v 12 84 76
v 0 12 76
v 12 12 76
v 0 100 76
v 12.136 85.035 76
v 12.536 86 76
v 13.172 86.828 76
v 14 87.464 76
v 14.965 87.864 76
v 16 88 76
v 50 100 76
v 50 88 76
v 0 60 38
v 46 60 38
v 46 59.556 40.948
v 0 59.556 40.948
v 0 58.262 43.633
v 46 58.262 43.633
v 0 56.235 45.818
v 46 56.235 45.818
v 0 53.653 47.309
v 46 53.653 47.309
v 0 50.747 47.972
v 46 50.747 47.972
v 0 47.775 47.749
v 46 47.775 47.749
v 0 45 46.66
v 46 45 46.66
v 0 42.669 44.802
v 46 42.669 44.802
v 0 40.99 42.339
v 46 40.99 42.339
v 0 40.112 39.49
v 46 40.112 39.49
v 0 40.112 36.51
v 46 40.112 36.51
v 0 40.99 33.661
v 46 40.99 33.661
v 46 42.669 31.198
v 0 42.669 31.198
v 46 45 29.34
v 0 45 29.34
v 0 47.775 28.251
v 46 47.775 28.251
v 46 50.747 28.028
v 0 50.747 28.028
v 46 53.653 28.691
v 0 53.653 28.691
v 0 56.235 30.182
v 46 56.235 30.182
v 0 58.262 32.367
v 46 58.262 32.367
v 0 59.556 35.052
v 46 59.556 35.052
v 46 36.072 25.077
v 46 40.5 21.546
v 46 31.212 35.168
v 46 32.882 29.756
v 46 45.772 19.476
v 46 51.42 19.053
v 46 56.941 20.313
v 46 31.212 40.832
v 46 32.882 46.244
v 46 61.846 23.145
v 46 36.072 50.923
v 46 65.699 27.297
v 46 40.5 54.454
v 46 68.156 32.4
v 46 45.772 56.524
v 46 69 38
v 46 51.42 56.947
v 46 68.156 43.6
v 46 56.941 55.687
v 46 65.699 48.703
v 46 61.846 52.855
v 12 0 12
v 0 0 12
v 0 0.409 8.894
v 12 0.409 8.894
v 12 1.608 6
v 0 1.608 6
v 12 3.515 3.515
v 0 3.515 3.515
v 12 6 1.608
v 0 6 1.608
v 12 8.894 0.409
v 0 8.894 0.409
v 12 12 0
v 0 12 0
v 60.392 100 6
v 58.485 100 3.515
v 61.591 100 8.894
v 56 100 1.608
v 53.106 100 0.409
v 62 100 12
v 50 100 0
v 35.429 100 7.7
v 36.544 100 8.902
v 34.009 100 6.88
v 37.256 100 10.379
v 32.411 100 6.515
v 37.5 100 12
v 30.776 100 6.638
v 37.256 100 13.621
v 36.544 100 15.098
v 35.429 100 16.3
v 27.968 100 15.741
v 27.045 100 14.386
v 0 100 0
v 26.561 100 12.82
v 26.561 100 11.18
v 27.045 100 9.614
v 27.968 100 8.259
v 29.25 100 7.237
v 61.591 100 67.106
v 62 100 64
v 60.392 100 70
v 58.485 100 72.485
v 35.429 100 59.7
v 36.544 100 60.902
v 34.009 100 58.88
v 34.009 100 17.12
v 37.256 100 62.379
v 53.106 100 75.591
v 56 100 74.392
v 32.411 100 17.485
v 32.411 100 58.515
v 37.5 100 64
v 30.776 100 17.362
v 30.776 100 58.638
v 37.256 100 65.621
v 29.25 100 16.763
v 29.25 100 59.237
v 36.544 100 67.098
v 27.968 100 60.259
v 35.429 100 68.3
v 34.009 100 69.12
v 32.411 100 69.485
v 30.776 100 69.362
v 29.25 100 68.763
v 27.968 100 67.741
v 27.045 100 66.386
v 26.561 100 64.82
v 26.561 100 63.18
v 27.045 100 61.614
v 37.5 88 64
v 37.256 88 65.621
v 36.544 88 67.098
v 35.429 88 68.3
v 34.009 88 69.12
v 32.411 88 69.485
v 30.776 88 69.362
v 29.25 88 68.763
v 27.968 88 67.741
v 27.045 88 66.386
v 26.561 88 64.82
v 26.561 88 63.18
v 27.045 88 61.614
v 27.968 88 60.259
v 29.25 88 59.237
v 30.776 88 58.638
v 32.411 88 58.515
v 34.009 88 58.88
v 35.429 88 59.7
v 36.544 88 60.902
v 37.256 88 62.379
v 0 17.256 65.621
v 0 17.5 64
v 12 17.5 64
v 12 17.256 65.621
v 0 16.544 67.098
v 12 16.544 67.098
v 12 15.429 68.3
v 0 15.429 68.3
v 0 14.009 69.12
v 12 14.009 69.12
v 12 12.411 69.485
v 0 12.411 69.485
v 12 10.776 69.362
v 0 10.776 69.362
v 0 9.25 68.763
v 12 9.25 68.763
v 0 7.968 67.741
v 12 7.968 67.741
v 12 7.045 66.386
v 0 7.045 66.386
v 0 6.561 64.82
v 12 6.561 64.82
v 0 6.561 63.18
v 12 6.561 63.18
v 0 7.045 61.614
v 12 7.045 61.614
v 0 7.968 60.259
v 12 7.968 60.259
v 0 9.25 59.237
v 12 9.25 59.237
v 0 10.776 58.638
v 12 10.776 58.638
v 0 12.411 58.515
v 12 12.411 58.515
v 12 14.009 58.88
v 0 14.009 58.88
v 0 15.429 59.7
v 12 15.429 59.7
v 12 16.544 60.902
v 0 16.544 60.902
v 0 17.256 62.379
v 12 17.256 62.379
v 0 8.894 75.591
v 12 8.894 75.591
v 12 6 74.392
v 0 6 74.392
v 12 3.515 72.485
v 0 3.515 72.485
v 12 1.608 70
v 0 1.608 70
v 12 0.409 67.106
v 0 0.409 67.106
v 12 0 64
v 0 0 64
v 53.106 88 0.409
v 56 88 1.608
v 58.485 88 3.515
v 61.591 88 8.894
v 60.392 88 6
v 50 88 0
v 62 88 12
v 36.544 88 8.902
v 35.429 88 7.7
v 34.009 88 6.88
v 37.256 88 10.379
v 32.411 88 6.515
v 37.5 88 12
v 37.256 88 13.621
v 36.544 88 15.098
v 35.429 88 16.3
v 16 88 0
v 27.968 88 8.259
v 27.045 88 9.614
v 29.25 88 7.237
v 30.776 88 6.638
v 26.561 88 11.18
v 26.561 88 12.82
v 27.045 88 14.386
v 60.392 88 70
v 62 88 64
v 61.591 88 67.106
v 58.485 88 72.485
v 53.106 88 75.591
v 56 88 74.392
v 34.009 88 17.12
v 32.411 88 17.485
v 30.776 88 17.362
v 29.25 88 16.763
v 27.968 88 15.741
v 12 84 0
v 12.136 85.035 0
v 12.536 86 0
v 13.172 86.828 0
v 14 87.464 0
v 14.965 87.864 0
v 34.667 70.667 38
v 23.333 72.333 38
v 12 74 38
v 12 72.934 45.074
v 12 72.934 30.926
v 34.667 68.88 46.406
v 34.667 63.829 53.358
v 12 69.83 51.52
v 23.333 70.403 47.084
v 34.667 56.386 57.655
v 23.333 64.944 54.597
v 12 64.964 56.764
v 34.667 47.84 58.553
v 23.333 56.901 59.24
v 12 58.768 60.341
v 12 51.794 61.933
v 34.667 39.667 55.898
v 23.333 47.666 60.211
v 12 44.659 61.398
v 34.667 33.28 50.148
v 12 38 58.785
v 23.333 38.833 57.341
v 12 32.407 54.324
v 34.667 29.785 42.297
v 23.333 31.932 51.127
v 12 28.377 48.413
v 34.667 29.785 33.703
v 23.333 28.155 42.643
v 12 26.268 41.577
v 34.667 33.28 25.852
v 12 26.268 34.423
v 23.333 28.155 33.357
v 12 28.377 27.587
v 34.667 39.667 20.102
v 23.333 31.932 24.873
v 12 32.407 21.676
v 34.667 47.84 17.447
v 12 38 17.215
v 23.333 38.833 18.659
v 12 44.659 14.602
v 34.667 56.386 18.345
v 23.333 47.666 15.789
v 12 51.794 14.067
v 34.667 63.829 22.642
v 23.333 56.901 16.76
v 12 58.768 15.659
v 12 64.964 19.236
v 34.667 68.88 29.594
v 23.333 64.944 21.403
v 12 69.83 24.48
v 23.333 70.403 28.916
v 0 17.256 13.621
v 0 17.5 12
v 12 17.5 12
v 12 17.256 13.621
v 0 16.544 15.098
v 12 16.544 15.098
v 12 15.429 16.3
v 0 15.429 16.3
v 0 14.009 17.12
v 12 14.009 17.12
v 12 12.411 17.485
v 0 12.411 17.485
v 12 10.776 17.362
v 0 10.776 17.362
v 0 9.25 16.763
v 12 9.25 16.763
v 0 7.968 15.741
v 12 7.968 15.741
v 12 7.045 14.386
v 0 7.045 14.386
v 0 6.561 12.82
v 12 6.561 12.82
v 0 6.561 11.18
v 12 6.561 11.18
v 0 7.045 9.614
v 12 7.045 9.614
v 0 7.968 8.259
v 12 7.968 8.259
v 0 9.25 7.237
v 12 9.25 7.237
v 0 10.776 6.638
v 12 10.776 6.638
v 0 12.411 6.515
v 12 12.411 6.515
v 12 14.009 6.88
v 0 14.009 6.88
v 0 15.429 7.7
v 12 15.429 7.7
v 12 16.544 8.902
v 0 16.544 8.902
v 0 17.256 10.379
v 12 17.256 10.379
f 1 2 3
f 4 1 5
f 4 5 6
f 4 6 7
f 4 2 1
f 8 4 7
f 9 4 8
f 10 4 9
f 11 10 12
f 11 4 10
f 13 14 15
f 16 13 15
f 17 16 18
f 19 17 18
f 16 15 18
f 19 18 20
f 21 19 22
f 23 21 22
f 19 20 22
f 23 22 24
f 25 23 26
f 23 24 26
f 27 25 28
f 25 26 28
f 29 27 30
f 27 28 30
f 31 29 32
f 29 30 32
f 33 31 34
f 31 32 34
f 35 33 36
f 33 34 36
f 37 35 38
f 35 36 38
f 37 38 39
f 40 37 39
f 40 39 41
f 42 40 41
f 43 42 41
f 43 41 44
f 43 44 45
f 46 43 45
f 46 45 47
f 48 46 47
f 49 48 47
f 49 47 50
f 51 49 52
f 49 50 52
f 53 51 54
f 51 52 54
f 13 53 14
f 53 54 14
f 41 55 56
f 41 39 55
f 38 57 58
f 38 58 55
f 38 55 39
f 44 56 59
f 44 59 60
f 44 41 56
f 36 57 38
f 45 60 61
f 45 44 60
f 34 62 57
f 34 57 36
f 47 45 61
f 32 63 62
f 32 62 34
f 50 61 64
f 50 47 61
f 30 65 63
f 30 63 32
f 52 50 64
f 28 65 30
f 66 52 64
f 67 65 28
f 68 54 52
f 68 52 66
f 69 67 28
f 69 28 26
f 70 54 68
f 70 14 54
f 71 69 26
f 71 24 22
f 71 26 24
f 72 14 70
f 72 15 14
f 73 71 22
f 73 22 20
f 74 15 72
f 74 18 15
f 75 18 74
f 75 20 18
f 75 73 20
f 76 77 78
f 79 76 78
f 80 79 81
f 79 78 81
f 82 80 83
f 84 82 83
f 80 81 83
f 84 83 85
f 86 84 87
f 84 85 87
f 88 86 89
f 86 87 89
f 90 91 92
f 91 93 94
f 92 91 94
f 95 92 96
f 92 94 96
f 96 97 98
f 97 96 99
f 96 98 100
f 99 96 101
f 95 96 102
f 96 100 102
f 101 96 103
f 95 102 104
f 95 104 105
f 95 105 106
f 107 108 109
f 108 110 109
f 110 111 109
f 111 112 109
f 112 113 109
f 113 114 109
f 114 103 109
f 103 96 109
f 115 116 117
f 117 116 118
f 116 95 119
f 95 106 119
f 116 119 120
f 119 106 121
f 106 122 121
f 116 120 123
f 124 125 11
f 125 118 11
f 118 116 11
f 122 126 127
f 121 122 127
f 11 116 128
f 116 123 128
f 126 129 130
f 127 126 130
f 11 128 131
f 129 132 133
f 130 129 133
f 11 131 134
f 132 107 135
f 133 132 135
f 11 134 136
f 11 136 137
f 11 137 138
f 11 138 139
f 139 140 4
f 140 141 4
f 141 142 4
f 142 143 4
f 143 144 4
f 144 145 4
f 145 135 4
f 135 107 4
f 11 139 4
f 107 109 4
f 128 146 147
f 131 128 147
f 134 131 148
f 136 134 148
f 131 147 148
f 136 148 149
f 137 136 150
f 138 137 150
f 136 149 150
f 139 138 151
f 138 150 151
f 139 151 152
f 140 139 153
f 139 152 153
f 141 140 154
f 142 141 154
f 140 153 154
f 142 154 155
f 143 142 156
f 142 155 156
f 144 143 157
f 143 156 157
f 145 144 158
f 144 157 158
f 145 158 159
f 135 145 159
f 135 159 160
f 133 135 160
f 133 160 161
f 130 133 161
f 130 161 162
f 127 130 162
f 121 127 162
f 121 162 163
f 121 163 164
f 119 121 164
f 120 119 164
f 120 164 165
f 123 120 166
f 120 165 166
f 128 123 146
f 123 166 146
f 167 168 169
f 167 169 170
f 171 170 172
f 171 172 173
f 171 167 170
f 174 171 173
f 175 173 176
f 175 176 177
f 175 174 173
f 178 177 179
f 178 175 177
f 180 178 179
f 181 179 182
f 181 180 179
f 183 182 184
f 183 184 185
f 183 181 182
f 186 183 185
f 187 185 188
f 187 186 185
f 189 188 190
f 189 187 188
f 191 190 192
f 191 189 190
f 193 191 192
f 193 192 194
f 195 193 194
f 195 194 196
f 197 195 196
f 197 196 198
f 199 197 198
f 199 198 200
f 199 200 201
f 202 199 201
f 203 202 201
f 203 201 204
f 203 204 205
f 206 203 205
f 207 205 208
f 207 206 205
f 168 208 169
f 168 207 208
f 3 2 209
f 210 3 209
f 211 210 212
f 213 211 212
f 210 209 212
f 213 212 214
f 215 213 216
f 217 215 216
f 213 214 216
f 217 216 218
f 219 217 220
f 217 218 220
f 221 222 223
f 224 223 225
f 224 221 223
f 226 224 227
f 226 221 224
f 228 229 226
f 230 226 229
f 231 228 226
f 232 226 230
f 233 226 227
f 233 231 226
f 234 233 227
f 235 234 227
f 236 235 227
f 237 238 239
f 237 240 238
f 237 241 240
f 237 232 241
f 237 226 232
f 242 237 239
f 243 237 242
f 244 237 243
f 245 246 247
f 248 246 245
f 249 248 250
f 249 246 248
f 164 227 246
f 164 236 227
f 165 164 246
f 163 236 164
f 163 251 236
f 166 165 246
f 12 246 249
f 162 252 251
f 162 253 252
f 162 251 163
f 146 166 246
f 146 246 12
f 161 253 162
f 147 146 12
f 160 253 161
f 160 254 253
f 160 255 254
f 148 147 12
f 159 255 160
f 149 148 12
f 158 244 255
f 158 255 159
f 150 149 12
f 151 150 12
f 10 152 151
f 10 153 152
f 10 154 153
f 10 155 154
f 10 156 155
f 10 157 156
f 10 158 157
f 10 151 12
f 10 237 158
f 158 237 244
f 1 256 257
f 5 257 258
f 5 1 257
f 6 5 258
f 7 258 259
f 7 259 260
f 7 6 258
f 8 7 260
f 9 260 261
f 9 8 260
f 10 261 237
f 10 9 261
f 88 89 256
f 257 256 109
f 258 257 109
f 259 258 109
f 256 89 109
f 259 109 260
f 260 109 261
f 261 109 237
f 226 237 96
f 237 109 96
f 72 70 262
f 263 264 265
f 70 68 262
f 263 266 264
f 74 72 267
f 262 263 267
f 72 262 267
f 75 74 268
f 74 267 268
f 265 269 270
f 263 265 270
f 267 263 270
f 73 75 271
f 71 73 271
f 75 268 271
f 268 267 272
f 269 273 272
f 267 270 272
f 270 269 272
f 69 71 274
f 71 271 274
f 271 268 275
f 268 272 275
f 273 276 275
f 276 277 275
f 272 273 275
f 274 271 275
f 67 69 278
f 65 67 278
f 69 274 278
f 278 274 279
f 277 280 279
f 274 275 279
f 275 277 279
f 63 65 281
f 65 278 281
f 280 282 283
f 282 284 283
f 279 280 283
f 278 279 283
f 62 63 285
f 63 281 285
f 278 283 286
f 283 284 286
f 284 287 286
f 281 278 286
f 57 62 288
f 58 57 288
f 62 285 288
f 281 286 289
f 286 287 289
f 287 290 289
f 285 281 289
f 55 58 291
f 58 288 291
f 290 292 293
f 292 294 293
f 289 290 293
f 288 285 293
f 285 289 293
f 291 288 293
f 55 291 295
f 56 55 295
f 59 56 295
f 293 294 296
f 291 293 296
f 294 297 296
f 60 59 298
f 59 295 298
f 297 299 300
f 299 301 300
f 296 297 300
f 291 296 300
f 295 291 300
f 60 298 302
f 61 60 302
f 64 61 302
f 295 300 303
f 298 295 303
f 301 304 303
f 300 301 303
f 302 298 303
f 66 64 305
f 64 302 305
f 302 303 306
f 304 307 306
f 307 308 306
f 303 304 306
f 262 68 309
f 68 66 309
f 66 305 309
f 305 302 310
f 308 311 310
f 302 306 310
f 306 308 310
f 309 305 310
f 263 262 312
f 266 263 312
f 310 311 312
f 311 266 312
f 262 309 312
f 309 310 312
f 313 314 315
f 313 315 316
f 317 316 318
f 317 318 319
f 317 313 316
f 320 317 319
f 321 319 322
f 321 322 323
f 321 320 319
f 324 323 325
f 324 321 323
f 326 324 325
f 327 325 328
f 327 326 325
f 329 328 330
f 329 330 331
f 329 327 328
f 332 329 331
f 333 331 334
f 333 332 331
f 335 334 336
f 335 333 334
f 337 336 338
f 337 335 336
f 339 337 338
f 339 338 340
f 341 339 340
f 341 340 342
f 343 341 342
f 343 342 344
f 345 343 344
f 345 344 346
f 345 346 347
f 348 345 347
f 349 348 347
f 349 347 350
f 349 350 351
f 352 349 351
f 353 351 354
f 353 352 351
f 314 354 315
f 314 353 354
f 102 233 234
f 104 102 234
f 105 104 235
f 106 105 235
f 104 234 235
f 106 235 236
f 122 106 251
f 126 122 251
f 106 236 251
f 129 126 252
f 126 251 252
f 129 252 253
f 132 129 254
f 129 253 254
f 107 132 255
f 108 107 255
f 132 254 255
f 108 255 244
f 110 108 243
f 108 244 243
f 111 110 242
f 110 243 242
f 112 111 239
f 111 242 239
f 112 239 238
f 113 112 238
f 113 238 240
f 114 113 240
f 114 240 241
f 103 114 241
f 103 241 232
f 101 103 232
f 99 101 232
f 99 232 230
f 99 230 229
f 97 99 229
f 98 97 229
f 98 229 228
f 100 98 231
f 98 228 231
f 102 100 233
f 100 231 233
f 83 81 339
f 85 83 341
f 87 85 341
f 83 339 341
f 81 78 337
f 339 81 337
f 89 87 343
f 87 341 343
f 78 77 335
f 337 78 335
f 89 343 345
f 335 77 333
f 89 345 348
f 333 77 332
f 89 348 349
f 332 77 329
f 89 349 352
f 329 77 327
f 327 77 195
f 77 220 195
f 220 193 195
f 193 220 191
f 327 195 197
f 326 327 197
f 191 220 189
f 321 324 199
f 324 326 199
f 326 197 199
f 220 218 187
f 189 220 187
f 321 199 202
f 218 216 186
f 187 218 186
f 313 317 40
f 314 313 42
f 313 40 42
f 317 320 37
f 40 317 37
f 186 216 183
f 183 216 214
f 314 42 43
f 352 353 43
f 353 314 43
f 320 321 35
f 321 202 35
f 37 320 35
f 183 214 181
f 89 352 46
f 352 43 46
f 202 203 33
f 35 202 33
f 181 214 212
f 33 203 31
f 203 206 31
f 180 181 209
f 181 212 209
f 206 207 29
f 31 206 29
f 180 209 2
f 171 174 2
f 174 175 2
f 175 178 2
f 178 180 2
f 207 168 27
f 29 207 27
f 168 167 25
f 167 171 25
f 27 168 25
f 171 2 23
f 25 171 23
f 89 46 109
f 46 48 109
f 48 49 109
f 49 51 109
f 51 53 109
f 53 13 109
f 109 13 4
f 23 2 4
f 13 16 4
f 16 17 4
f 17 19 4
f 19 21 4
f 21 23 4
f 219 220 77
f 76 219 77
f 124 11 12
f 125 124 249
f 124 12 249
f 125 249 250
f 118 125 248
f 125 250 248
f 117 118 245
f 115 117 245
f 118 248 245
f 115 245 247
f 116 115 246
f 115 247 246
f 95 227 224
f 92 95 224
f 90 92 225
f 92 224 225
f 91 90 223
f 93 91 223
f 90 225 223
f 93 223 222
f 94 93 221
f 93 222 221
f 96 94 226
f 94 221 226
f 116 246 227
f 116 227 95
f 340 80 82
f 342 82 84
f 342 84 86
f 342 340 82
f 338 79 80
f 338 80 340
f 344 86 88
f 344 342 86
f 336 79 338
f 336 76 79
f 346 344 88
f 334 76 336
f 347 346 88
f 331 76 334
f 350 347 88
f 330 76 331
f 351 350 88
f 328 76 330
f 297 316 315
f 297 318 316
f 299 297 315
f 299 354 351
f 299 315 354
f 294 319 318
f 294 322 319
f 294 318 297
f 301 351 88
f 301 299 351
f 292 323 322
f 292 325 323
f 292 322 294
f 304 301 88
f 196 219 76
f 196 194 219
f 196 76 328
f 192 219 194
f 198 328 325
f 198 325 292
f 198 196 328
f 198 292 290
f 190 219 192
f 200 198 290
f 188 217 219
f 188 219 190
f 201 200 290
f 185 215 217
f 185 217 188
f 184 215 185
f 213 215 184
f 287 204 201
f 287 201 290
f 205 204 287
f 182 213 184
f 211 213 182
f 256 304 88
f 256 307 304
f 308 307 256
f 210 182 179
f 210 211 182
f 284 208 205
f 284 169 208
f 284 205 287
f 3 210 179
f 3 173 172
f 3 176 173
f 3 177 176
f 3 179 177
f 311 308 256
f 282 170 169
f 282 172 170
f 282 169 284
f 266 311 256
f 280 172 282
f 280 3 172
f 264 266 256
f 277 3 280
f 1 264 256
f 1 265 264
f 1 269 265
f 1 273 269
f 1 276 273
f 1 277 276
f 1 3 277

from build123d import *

# Parameters (mm, degrees)
F0_R      = 5.5
F1_DEPTH  = 12
F2_W      = 12
F2_H      = 76
F3_DEPTH  = 50
F4_R      = 5.5
F5_DEPTH  = 12
F8_R      = 19
F6_R      = 24
F10_R     = 10
F11_DEPTH = 46
F13_DEPTH = 76


with BuildPart() as f1:
    # F0 (on Right) → F1 (new body)
    with BuildSketch(Plane.YZ):
        with BuildLine():
            ThreePointArc((0, 12), (3.5147186258, 3.5147186258), (12, 0))
            Line((12, 0), (100, 0))
            Line((100, 0), (100, 76))
            Line((100, 76), (12, 76))
            ThreePointArc((12, 76), (3.5147186258, 72.4852813742), (0, 64))
            Line((0, 64), (0, 12))
        make_face()
        with Locations((12, 12)):
            Circle(F0_R, mode=Mode.SUBTRACT)
        with Locations((12, 64)):
            Circle(F0_R, mode=Mode.SUBTRACT)
    extrude(amount=F1_DEPTH)

    # F2 (on face) → F3 (join)
    with BuildSketch(Plane.YZ.offset(12)):
        with Locations((94, 38)):
            Rectangle(F2_W, F2_H)
    extrude(amount=F3_DEPTH)

    # F4 (on face) → F5 (cut)
    with BuildSketch(Plane.XZ.offset(-88)):
        with Locations((32, 64)):
            Circle(F4_R)
        with Locations((32, 12)):
            Circle(F4_R)
        with BuildLine():
            ThreePointArc((50, 76), (58.4852813742, 72.4852813742), (62, 64))
            Line((62, 64), (62, 76))
            Line((62, 76), (50, 76))
        make_face()
        with BuildLine():
            Line((62, 0), (62, 12))
            ThreePointArc((62, 12), (58.4852813742, 3.5147186258), (50, 0))
            Line((50, 0), (62, 0))
        make_face()
    extrude(amount=-F5_DEPTH, mode=Mode.SUBTRACT)

    # F8 (on offset) → F9 section 0
    with BuildSketch(Plane.YZ.offset(46)):
        with Locations((50, 38)):
            Circle(F8_R)
    # F6 (on face) → F9 section 1
    with BuildSketch(Plane.YZ.offset(12)):
        with Locations((50, 38)):
            Circle(F6_R)
    loft()

    # F10 (on face) → F11 (cut)
    with BuildSketch(Plane.YZ.offset(46)):
        with Locations((50, 38)):
            Circle(F10_R)
    extrude(amount=-F11_DEPTH, mode=Mode.SUBTRACT)

    # F12 (on face) → F13 (join)
    with BuildSketch(Plane.XY.offset(76)):
        with BuildLine():
            ThreePointArc((12, 84), (13.1715728753, 86.8284271247), (16, 88))
            Line((16, 88), (12, 88))
            Line((12, 88), (12, 84))
        make_face()
    extrude(amount=-F13_DEPTH)


solid = f1.part
